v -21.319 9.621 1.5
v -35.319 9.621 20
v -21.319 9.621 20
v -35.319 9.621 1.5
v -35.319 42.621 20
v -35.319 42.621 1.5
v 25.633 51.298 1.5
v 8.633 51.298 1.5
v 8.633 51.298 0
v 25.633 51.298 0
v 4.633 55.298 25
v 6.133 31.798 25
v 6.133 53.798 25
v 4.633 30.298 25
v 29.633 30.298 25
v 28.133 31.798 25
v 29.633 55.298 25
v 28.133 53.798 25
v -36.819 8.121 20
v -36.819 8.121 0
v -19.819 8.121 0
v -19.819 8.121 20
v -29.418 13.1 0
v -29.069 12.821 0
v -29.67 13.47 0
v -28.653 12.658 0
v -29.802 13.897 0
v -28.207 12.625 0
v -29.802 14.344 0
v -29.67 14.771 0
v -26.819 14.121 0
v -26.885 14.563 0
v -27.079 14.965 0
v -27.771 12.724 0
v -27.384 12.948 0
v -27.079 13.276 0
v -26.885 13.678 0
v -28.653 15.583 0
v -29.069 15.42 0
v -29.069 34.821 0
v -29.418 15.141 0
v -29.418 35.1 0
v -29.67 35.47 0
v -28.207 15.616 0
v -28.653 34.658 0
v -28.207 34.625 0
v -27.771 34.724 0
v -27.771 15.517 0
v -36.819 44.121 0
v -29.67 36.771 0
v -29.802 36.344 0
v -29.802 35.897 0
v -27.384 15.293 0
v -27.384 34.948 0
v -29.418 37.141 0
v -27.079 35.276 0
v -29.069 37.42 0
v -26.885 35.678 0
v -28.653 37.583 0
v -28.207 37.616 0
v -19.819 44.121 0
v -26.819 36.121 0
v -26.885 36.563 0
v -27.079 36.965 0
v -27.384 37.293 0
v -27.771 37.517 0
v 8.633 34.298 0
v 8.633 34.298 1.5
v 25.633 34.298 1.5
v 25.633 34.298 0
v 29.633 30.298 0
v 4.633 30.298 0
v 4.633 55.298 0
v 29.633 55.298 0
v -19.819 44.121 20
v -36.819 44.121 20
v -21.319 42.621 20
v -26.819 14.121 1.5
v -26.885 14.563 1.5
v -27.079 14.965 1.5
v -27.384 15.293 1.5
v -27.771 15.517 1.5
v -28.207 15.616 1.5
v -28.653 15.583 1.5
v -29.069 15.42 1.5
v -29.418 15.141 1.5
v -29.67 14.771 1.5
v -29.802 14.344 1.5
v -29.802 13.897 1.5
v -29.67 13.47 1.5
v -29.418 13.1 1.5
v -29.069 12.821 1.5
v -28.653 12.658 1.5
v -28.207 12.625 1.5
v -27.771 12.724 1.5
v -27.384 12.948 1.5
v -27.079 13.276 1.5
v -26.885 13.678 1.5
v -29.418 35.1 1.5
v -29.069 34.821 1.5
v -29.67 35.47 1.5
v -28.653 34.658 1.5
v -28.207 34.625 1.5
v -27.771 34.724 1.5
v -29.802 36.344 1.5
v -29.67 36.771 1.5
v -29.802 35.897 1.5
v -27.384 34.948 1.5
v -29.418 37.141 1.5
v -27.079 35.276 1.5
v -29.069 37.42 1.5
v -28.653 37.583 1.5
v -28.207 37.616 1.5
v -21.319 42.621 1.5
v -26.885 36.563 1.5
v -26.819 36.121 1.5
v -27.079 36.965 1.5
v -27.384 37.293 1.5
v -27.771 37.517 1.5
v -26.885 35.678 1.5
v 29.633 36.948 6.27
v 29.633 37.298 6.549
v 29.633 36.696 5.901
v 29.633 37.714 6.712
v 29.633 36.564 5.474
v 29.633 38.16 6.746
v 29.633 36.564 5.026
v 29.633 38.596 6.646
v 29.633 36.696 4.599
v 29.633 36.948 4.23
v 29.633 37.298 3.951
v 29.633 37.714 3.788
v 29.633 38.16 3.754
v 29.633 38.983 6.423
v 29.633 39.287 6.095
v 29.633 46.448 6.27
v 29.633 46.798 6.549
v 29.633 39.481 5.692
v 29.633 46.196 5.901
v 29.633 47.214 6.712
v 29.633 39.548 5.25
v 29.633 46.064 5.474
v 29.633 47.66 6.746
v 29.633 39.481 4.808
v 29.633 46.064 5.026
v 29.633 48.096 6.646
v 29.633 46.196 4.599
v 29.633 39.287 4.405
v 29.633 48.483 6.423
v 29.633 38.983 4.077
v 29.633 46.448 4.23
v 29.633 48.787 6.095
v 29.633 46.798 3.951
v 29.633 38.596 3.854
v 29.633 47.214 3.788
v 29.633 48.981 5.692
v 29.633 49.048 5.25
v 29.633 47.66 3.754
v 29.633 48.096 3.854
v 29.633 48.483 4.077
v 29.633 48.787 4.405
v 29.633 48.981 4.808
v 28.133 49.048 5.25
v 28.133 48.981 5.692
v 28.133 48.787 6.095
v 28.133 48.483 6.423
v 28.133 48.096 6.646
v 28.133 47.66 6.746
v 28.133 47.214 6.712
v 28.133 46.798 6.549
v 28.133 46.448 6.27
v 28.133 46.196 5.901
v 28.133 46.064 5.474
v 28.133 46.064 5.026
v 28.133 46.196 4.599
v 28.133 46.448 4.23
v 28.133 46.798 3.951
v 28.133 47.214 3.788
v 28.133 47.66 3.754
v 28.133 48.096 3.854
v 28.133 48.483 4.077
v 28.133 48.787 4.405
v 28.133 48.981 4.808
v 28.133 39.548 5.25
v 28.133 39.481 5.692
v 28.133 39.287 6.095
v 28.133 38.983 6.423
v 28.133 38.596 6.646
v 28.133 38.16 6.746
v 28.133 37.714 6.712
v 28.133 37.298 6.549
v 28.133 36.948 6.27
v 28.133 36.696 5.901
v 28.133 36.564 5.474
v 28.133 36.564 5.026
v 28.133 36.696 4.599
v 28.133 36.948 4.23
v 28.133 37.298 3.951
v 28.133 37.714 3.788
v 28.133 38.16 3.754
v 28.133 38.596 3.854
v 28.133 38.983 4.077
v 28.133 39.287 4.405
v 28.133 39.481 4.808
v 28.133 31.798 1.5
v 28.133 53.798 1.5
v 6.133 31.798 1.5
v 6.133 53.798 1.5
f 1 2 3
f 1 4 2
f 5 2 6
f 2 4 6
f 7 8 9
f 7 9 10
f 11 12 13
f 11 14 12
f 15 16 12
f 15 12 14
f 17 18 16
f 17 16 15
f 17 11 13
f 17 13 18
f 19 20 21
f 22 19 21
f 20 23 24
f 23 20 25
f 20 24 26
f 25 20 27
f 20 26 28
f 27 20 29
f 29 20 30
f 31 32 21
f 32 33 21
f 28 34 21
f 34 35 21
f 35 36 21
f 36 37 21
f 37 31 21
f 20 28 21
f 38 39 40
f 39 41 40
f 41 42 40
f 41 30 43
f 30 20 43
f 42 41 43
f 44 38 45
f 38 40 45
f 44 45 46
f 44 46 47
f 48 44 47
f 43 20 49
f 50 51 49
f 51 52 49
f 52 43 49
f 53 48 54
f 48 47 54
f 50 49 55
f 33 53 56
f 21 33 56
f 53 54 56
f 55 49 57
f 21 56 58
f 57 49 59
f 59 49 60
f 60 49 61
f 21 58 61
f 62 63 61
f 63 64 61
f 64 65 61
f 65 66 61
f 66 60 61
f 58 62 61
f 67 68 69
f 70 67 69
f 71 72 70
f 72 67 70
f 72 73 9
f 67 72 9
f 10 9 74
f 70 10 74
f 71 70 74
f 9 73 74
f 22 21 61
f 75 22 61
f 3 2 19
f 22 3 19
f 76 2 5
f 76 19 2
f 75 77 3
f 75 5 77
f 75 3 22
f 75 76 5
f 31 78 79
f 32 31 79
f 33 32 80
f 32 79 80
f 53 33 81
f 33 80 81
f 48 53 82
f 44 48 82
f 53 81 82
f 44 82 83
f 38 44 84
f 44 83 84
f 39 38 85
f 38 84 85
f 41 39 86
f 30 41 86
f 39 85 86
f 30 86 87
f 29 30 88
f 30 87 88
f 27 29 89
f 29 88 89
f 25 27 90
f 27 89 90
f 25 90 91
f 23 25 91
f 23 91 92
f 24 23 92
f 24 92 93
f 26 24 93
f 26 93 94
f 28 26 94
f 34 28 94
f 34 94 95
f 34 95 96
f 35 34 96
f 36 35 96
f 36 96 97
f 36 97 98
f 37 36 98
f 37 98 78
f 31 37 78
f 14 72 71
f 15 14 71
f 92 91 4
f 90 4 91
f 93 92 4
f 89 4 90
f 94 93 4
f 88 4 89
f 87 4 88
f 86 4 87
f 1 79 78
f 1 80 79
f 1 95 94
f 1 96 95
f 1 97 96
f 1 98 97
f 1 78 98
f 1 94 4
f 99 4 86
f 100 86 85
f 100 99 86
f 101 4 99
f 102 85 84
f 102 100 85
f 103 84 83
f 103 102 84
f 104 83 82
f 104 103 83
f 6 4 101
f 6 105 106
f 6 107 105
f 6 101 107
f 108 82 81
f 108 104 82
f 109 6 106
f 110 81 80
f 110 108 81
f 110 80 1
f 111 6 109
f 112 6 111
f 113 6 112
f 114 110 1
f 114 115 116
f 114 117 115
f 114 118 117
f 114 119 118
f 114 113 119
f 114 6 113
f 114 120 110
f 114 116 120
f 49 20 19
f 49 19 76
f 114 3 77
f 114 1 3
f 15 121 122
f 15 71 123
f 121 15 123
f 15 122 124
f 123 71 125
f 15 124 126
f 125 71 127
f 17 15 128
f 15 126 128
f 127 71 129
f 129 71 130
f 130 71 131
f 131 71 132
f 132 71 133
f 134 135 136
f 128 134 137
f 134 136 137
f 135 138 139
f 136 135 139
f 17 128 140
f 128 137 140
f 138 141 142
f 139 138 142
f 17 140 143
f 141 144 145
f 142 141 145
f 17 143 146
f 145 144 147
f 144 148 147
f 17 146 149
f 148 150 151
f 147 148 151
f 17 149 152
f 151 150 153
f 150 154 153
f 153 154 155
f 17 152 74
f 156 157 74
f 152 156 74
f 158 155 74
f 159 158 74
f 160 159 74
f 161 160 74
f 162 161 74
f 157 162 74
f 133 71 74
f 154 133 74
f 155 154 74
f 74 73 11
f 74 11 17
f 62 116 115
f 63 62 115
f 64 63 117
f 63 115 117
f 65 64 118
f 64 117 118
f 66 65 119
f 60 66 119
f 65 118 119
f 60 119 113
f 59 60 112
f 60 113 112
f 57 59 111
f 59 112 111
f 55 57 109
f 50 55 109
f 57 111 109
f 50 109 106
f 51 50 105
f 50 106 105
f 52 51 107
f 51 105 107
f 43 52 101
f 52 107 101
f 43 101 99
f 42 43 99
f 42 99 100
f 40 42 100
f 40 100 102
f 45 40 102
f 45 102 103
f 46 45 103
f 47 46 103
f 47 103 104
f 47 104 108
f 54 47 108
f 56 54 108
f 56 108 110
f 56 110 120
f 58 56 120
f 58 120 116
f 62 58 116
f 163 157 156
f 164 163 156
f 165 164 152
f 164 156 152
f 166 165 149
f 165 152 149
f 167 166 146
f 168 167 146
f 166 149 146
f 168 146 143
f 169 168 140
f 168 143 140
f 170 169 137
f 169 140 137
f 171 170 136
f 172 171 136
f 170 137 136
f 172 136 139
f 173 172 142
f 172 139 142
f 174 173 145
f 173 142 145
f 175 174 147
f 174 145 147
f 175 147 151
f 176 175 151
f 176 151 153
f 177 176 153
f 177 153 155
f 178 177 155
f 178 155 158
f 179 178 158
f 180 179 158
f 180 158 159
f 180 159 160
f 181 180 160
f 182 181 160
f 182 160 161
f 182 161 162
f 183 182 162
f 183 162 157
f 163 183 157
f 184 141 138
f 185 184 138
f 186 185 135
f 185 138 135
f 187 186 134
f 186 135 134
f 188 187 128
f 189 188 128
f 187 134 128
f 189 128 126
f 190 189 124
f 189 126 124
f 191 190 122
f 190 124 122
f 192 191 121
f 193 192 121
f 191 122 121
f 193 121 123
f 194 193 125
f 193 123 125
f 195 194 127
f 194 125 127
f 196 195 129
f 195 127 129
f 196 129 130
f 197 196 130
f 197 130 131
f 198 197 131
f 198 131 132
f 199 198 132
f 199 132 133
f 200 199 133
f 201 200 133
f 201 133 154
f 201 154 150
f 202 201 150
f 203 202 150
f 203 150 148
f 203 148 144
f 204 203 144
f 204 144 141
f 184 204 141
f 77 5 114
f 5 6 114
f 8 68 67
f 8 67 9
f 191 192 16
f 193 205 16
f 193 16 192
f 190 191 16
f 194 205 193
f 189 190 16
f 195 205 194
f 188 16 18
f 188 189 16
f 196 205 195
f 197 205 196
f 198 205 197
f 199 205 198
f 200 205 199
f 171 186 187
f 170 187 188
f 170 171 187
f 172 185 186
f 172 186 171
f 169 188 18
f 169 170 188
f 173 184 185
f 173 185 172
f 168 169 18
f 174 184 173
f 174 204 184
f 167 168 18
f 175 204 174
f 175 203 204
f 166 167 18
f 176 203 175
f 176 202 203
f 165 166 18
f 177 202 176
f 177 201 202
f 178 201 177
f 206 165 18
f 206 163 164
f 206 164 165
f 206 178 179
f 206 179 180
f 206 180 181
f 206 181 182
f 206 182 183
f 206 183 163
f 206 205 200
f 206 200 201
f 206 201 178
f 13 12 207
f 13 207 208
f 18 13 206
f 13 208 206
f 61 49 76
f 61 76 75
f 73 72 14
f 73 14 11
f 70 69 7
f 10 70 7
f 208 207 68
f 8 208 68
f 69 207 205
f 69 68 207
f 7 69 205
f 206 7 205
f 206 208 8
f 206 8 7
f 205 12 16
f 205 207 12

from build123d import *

# Parameters (mm, degrees)
F0_W      = 17
F0_H      = 36
F1_DEPTH  = 20
F2_T      = -1.5
F3_W      = 25
F3_H      = 25
F4_DEPTH  = 25
F5_T      = -1.5
F7_W      = 17
F7_H      = 17
F8_DEPTH  = 25
F9_R      = 1.5
F10_DEPTH = 63.5
F6_R      = 1.5
F11_DEPTH = 10


with BuildPart() as f1:
    # F0 (on Top) → F1 (new body)
    with BuildSketch(Plane.XY):
        with Locations((-28.318797, 26.120505)):
            Rectangle(F0_W, F0_H)
    extrude(amount=F1_DEPTH)

    # F2
    f2_openings = [f1.faces().sort_by_distance(p)[0] for p in [
        (-28.318797, 26.120505, 20),
    ]]
    offset(amount=F2_T, openings=f2_openings)

    # F9 (on face) → F10 (cut)
    with BuildSketch(Plane.XY.offset(1.5)):
        with Locations((-28.318797, 36.120505)):
            Circle(F9_R)
        with Locations((-28.318797, 14.120505)):
            Circle(F9_R)
    extrude(amount=-F10_DEPTH, mode=Mode.SUBTRACT)


with BuildPart() as f4:
    # F3 (on Top) → F4 (new body)
    with BuildSketch(Plane.XY):
        with Locations((17.132554, 42.797711)):
            Rectangle(F3_W, F3_H)
    extrude(amount=F4_DEPTH)

    # F5
    f5_openings = [f4.faces().sort_by_distance(p)[0] for p in [
        (17.132554, 42.797711, 25),
    ]]
    offset(amount=F5_T, openings=f5_openings)

    # F7 (on face) → F8 (cut)
    with BuildSketch(Plane.XY.offset(1.5)):
        with Locations((17.132554, 42.797711)):
            Rectangle(F7_W, F7_H)
    extrude(amount=-F8_DEPTH, mode=Mode.SUBTRACT)

    # F6 (on face) → F11 (cut)
    with BuildSketch(Plane.YZ.offset(29.632554)):
        with Locations((38.047711, 5.25)):
            Circle(F6_R)
        with Locations((47.547711, 5.25)):
            Circle(F6_R)
    extrude(amount=-F11_DEPTH, mode=Mode.SUBTRACT)


solid = Compound([f1.part, f4.part])
